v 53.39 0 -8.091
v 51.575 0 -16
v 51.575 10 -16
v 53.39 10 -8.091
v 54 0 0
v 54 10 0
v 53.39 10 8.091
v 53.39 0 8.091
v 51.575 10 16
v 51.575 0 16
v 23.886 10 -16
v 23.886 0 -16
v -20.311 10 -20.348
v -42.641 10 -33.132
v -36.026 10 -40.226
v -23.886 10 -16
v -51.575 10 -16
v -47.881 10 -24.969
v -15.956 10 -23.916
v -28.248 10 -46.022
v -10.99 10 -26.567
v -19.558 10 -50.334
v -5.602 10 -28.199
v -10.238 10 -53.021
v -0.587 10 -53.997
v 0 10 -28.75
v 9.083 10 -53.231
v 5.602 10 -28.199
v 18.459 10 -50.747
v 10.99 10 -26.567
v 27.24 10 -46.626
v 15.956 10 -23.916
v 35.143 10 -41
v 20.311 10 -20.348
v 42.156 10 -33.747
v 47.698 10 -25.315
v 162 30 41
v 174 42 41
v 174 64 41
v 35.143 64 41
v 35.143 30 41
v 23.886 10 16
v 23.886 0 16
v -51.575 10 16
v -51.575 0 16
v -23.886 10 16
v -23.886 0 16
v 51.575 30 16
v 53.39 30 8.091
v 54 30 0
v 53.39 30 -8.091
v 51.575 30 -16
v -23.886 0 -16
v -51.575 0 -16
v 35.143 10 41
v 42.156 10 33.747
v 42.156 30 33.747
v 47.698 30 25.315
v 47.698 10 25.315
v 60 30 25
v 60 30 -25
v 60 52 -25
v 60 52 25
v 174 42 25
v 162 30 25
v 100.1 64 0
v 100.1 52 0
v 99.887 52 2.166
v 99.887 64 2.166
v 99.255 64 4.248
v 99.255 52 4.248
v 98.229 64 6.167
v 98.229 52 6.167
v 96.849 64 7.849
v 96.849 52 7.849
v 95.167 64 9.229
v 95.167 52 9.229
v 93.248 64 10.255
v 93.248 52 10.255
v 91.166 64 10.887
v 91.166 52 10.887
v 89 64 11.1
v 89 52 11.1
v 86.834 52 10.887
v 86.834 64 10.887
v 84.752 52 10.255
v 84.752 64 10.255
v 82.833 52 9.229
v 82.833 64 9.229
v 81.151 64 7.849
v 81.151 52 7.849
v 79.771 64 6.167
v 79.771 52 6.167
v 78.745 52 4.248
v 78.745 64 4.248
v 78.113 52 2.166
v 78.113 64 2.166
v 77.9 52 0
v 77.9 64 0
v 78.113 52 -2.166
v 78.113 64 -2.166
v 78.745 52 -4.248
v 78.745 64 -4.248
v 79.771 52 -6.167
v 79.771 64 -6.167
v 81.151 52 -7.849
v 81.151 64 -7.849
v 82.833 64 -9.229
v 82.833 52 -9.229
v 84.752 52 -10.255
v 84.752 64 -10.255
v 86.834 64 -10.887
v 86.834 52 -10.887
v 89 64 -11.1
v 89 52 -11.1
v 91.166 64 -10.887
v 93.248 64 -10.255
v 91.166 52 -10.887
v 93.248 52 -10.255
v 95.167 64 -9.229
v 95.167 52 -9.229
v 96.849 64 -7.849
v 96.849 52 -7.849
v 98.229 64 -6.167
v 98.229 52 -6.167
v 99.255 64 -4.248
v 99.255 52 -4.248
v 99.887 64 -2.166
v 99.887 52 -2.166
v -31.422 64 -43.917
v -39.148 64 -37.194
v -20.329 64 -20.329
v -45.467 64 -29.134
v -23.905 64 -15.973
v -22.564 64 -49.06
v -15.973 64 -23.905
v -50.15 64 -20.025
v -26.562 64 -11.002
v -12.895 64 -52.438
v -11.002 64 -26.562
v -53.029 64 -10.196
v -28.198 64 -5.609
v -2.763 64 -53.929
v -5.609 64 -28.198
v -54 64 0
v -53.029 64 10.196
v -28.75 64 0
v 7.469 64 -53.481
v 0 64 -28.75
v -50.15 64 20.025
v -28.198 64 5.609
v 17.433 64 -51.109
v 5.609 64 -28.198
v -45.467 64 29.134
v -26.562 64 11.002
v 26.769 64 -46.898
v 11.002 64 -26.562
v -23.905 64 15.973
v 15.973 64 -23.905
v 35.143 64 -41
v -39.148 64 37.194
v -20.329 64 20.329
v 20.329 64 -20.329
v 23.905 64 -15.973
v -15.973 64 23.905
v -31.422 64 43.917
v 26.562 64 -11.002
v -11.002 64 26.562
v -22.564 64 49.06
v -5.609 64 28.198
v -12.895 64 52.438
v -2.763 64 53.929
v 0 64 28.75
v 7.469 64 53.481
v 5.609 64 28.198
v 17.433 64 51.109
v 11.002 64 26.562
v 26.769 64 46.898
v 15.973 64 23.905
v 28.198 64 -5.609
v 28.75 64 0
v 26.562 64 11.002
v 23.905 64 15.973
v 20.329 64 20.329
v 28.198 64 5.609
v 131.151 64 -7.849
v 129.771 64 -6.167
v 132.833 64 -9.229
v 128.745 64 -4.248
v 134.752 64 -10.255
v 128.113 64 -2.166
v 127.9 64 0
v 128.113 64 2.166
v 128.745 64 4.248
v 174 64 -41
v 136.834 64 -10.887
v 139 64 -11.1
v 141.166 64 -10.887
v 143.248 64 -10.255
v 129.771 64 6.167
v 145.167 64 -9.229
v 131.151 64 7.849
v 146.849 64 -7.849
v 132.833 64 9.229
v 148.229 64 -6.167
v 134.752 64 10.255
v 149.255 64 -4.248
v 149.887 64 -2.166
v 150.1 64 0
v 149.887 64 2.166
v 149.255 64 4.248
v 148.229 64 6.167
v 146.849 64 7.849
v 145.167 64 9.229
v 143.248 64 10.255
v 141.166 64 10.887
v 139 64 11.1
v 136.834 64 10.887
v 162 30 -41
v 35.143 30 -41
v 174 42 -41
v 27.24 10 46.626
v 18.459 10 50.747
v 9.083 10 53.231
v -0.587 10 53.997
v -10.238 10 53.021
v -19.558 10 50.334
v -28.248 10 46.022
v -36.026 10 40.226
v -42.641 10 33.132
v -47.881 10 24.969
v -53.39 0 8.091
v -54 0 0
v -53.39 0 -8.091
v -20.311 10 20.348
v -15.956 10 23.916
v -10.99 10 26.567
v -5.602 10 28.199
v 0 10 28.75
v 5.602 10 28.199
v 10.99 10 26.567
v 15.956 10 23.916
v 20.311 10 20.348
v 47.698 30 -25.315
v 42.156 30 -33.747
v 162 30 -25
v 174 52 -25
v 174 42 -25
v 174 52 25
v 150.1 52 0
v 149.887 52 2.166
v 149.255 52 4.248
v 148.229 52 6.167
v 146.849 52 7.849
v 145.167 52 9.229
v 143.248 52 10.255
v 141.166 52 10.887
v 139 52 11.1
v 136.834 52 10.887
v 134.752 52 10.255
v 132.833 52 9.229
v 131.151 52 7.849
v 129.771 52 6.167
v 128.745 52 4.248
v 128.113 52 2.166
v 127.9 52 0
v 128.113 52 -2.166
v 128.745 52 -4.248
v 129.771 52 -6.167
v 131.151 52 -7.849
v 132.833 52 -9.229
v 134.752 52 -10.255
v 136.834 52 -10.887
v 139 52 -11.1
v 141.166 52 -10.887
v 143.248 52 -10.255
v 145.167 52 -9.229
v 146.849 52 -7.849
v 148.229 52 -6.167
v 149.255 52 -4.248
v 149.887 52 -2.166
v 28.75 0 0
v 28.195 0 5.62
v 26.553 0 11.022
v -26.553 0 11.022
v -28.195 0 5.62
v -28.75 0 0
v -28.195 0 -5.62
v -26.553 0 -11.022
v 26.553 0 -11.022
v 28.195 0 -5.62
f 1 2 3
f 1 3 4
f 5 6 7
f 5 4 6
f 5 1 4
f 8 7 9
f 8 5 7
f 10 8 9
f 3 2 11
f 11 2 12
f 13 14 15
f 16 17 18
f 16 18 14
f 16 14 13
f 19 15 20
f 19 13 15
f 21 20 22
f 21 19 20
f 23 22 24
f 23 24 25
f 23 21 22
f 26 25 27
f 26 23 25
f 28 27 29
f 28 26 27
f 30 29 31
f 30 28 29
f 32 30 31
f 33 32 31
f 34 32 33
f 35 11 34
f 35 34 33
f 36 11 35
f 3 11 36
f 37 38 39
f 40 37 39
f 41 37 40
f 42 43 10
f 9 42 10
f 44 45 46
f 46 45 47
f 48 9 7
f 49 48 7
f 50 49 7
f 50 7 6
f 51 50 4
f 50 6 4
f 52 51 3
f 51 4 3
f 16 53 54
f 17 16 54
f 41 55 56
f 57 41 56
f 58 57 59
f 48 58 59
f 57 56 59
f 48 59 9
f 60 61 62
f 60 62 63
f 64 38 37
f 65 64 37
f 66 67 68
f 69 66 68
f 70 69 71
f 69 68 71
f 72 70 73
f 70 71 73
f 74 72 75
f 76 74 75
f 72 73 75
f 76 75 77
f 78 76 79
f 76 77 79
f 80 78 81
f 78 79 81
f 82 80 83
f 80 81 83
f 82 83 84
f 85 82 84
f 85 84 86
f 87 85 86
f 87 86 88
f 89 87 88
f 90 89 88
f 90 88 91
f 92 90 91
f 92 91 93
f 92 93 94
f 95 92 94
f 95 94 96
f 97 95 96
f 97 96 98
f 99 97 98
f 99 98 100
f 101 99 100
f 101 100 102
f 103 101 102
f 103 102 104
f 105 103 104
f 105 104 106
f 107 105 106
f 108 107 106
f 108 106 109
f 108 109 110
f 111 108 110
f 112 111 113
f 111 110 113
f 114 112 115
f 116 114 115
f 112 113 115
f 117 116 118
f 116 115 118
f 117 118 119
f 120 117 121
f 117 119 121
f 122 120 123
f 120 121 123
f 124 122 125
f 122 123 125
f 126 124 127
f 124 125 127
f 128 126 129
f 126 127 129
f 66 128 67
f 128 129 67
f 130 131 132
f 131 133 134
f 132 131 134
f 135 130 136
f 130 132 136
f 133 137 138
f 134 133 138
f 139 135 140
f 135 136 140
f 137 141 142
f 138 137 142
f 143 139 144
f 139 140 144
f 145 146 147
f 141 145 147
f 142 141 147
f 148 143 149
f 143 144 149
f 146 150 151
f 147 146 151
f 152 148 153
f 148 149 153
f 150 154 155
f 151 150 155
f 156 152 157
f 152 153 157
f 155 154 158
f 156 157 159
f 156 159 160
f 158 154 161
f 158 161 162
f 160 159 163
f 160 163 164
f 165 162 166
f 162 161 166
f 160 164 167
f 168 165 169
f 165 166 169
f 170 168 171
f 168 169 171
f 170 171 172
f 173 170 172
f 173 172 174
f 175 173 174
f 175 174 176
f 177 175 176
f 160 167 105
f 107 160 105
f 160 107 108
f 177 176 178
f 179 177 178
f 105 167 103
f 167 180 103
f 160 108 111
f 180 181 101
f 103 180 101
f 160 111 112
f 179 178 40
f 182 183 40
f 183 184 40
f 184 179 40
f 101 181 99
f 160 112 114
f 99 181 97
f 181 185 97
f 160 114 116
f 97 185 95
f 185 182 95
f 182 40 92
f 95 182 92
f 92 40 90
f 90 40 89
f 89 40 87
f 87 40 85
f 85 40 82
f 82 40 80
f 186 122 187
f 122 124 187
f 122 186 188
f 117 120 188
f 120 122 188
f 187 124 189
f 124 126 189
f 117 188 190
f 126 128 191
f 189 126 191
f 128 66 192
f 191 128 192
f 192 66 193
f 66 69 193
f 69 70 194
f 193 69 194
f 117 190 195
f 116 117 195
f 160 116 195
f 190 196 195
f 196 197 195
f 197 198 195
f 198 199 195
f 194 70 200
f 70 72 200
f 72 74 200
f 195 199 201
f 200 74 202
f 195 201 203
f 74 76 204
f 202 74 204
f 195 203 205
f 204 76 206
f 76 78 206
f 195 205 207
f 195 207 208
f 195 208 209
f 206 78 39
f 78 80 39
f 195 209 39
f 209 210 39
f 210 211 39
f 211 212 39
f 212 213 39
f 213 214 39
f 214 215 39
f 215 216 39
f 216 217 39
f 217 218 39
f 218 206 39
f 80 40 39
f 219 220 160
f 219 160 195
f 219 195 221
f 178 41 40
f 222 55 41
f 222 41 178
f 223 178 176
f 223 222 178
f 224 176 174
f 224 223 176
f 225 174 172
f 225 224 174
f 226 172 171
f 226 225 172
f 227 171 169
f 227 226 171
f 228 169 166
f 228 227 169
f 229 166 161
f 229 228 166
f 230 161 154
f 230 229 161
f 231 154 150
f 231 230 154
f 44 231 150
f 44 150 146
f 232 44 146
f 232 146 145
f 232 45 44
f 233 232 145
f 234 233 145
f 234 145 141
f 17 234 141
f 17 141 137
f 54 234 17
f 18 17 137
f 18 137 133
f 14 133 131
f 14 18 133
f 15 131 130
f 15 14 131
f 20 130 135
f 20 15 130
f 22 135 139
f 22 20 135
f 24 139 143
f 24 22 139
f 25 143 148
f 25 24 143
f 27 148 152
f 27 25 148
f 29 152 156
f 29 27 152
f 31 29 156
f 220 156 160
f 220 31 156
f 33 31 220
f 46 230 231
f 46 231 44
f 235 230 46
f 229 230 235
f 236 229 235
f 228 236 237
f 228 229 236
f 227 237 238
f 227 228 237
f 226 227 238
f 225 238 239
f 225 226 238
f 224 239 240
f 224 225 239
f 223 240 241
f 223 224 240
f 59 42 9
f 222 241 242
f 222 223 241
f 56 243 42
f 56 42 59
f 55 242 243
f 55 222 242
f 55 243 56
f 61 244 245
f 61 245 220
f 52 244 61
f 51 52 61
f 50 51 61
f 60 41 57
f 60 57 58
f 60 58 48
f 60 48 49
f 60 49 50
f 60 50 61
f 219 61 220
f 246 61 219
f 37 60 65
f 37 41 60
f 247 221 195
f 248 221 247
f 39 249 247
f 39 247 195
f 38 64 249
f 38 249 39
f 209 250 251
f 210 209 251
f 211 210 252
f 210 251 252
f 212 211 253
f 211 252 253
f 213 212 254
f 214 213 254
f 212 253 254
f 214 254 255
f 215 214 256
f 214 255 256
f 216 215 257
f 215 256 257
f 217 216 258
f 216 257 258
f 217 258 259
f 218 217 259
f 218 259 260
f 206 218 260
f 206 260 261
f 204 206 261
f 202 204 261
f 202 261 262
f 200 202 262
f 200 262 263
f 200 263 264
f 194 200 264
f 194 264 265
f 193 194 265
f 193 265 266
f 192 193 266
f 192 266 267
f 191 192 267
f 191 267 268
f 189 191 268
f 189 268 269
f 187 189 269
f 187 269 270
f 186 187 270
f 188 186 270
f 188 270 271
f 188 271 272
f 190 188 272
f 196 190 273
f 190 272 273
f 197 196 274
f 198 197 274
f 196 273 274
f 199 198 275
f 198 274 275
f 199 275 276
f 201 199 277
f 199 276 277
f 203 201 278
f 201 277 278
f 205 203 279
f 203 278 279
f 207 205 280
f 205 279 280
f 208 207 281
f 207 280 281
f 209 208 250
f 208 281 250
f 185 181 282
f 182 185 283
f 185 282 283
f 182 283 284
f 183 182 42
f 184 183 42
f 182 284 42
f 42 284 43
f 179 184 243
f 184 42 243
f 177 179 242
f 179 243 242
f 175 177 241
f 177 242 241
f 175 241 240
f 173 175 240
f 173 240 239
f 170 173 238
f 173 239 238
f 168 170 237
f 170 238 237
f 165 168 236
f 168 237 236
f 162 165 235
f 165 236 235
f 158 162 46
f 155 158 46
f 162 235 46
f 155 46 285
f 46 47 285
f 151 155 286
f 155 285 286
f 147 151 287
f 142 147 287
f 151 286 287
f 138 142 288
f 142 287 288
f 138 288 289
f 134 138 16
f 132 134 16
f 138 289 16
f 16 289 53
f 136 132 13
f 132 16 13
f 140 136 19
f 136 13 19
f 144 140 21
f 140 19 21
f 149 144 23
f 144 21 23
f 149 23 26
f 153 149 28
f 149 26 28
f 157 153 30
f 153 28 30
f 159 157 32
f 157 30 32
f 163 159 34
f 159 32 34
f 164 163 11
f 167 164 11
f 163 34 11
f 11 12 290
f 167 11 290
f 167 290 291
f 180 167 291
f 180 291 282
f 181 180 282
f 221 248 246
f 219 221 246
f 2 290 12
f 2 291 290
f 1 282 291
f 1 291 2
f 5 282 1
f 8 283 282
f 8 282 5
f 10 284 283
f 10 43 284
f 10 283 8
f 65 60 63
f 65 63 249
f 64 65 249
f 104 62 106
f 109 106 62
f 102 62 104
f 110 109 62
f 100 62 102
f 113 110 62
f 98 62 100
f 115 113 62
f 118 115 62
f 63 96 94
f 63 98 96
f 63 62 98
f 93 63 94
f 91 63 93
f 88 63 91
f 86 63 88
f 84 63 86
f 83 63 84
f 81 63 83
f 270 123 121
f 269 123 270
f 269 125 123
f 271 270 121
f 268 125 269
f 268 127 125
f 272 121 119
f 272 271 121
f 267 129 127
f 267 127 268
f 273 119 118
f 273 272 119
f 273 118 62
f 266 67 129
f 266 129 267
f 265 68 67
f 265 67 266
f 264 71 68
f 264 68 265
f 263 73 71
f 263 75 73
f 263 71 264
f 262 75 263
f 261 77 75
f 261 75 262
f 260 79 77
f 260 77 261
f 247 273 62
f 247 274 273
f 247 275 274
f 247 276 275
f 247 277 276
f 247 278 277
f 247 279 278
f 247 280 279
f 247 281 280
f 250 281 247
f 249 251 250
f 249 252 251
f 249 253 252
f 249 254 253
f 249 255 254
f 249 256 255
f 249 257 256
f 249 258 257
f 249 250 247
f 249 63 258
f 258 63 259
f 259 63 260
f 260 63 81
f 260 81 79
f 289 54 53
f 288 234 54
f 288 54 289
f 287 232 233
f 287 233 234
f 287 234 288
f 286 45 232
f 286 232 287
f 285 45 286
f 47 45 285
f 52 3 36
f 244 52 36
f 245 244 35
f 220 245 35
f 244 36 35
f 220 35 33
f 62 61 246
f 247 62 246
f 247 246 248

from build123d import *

# Parameters (mm, degrees)
F0_R      = 54
F0_R_2    = 28.75
F1_DEPTH  = 64
F3_DEPTH  = 10
F4_R      = 11.1
F5_DEPTH  = 54
F6_DEPTH  = 20
F8_DEPTH  = 95.001
F9_W      = 114
F9_H      = 50
F10_DEPTH = 22


with BuildPart() as f1:
    # F0 (on Front) → F1 (new body)
    with BuildSketch(Plane.XZ):
        Circle(F0_R)
        Circle(F0_R_2, mode=Mode.SUBTRACT)
    extrude(amount=-F1_DEPTH)

    # F2 (on face) → F3 (cut)
    with BuildSketch(Plane.XZ):
        with BuildLine():
            ThreePointArc((23.88645, -16), (0, -28.75), (-23.88645, -16))
            Line((-23.88645, -16), (-51.575188, -16))
            ThreePointArc((-51.575188, -16), (0, -54), (51.575188, -16))
            Line((51.575188, -16), (23.88645, -16))
        make_face()
        with BuildLine():
            ThreePointArc((51.575188, 16), (0, 54), (-51.575188, 16))
            Line((-51.575188, 16), (-23.88645, 16))
            ThreePointArc((-23.88645, 16), (0, 28.75), (23.88645, 16))
            Line((23.88645, 16), (51.575188, 16))
        make_face()
    extrude(amount=-F3_DEPTH, mode=Mode.SUBTRACT)

    # F4 (on face) → F5 (join, through all)
    with BuildSketch(Plane.XZ.offset(-10)):
        with BuildLine():
            ThreePointArc((51.575188, -16), (45.124741, -29.660711), (35.142567, -41))
            Line((35.142567, -41), (174, -41))
            Line((174, -41), (174, 41))
            Line((174, 41), (35.142567, 41))
            ThreePointArc((35.142567, 41), (45.124741, 29.660711), (51.575188, 16))
            ThreePointArc((51.575188, 16), (54, 0), (51.575188, -16))
        make_face()
        with Locations((89, 0)):
            Circle(F4_R, mode=Mode.SUBTRACT)
        with Locations((139, 0)):
            Circle(F4_R, mode=Mode.SUBTRACT)
    extrude(amount=-F5_DEPTH)

    # F4 (on face) → F6 (cut)
    with BuildSketch(Plane.XZ.offset(-10)):
        with BuildLine():
            ThreePointArc((51.575188, -16), (45.124741, -29.660711), (35.142567, -41))
            Line((35.142567, -41), (174, -41))
            Line((174, -41), (174, 41))
            Line((174, 41), (35.142567, 41))
            ThreePointArc((35.142567, 41), (45.124741, 29.660711), (51.575188, 16))
            ThreePointArc((51.575188, 16), (54, 0), (51.575188, -16))
        make_face()
        with Locations((89, 0)):
            Circle(F4_R, mode=Mode.SUBTRACT)
        with Locations((139, 0)):
            Circle(F4_R, mode=Mode.SUBTRACT)
    extrude(amount=-F6_DEPTH, mode=Mode.SUBTRACT)

    # F7 (on face) → F8 (cut, through all)
    with BuildSketch(Plane.XY.offset(41)):
        Polygon((174, 42), (162, 30), (174, 30), align=None)
    extrude(amount=-F8_DEPTH, mode=Mode.SUBTRACT)

    # F9 (on face) → F10 (cut)
    with BuildSketch(Plane.XZ.offset(-30)):
        with Locations((117, 0)):
            Rectangle(F9_W, F9_H)
    extrude(amount=-F10_DEPTH, mode=Mode.SUBTRACT)


solid = f1.part
